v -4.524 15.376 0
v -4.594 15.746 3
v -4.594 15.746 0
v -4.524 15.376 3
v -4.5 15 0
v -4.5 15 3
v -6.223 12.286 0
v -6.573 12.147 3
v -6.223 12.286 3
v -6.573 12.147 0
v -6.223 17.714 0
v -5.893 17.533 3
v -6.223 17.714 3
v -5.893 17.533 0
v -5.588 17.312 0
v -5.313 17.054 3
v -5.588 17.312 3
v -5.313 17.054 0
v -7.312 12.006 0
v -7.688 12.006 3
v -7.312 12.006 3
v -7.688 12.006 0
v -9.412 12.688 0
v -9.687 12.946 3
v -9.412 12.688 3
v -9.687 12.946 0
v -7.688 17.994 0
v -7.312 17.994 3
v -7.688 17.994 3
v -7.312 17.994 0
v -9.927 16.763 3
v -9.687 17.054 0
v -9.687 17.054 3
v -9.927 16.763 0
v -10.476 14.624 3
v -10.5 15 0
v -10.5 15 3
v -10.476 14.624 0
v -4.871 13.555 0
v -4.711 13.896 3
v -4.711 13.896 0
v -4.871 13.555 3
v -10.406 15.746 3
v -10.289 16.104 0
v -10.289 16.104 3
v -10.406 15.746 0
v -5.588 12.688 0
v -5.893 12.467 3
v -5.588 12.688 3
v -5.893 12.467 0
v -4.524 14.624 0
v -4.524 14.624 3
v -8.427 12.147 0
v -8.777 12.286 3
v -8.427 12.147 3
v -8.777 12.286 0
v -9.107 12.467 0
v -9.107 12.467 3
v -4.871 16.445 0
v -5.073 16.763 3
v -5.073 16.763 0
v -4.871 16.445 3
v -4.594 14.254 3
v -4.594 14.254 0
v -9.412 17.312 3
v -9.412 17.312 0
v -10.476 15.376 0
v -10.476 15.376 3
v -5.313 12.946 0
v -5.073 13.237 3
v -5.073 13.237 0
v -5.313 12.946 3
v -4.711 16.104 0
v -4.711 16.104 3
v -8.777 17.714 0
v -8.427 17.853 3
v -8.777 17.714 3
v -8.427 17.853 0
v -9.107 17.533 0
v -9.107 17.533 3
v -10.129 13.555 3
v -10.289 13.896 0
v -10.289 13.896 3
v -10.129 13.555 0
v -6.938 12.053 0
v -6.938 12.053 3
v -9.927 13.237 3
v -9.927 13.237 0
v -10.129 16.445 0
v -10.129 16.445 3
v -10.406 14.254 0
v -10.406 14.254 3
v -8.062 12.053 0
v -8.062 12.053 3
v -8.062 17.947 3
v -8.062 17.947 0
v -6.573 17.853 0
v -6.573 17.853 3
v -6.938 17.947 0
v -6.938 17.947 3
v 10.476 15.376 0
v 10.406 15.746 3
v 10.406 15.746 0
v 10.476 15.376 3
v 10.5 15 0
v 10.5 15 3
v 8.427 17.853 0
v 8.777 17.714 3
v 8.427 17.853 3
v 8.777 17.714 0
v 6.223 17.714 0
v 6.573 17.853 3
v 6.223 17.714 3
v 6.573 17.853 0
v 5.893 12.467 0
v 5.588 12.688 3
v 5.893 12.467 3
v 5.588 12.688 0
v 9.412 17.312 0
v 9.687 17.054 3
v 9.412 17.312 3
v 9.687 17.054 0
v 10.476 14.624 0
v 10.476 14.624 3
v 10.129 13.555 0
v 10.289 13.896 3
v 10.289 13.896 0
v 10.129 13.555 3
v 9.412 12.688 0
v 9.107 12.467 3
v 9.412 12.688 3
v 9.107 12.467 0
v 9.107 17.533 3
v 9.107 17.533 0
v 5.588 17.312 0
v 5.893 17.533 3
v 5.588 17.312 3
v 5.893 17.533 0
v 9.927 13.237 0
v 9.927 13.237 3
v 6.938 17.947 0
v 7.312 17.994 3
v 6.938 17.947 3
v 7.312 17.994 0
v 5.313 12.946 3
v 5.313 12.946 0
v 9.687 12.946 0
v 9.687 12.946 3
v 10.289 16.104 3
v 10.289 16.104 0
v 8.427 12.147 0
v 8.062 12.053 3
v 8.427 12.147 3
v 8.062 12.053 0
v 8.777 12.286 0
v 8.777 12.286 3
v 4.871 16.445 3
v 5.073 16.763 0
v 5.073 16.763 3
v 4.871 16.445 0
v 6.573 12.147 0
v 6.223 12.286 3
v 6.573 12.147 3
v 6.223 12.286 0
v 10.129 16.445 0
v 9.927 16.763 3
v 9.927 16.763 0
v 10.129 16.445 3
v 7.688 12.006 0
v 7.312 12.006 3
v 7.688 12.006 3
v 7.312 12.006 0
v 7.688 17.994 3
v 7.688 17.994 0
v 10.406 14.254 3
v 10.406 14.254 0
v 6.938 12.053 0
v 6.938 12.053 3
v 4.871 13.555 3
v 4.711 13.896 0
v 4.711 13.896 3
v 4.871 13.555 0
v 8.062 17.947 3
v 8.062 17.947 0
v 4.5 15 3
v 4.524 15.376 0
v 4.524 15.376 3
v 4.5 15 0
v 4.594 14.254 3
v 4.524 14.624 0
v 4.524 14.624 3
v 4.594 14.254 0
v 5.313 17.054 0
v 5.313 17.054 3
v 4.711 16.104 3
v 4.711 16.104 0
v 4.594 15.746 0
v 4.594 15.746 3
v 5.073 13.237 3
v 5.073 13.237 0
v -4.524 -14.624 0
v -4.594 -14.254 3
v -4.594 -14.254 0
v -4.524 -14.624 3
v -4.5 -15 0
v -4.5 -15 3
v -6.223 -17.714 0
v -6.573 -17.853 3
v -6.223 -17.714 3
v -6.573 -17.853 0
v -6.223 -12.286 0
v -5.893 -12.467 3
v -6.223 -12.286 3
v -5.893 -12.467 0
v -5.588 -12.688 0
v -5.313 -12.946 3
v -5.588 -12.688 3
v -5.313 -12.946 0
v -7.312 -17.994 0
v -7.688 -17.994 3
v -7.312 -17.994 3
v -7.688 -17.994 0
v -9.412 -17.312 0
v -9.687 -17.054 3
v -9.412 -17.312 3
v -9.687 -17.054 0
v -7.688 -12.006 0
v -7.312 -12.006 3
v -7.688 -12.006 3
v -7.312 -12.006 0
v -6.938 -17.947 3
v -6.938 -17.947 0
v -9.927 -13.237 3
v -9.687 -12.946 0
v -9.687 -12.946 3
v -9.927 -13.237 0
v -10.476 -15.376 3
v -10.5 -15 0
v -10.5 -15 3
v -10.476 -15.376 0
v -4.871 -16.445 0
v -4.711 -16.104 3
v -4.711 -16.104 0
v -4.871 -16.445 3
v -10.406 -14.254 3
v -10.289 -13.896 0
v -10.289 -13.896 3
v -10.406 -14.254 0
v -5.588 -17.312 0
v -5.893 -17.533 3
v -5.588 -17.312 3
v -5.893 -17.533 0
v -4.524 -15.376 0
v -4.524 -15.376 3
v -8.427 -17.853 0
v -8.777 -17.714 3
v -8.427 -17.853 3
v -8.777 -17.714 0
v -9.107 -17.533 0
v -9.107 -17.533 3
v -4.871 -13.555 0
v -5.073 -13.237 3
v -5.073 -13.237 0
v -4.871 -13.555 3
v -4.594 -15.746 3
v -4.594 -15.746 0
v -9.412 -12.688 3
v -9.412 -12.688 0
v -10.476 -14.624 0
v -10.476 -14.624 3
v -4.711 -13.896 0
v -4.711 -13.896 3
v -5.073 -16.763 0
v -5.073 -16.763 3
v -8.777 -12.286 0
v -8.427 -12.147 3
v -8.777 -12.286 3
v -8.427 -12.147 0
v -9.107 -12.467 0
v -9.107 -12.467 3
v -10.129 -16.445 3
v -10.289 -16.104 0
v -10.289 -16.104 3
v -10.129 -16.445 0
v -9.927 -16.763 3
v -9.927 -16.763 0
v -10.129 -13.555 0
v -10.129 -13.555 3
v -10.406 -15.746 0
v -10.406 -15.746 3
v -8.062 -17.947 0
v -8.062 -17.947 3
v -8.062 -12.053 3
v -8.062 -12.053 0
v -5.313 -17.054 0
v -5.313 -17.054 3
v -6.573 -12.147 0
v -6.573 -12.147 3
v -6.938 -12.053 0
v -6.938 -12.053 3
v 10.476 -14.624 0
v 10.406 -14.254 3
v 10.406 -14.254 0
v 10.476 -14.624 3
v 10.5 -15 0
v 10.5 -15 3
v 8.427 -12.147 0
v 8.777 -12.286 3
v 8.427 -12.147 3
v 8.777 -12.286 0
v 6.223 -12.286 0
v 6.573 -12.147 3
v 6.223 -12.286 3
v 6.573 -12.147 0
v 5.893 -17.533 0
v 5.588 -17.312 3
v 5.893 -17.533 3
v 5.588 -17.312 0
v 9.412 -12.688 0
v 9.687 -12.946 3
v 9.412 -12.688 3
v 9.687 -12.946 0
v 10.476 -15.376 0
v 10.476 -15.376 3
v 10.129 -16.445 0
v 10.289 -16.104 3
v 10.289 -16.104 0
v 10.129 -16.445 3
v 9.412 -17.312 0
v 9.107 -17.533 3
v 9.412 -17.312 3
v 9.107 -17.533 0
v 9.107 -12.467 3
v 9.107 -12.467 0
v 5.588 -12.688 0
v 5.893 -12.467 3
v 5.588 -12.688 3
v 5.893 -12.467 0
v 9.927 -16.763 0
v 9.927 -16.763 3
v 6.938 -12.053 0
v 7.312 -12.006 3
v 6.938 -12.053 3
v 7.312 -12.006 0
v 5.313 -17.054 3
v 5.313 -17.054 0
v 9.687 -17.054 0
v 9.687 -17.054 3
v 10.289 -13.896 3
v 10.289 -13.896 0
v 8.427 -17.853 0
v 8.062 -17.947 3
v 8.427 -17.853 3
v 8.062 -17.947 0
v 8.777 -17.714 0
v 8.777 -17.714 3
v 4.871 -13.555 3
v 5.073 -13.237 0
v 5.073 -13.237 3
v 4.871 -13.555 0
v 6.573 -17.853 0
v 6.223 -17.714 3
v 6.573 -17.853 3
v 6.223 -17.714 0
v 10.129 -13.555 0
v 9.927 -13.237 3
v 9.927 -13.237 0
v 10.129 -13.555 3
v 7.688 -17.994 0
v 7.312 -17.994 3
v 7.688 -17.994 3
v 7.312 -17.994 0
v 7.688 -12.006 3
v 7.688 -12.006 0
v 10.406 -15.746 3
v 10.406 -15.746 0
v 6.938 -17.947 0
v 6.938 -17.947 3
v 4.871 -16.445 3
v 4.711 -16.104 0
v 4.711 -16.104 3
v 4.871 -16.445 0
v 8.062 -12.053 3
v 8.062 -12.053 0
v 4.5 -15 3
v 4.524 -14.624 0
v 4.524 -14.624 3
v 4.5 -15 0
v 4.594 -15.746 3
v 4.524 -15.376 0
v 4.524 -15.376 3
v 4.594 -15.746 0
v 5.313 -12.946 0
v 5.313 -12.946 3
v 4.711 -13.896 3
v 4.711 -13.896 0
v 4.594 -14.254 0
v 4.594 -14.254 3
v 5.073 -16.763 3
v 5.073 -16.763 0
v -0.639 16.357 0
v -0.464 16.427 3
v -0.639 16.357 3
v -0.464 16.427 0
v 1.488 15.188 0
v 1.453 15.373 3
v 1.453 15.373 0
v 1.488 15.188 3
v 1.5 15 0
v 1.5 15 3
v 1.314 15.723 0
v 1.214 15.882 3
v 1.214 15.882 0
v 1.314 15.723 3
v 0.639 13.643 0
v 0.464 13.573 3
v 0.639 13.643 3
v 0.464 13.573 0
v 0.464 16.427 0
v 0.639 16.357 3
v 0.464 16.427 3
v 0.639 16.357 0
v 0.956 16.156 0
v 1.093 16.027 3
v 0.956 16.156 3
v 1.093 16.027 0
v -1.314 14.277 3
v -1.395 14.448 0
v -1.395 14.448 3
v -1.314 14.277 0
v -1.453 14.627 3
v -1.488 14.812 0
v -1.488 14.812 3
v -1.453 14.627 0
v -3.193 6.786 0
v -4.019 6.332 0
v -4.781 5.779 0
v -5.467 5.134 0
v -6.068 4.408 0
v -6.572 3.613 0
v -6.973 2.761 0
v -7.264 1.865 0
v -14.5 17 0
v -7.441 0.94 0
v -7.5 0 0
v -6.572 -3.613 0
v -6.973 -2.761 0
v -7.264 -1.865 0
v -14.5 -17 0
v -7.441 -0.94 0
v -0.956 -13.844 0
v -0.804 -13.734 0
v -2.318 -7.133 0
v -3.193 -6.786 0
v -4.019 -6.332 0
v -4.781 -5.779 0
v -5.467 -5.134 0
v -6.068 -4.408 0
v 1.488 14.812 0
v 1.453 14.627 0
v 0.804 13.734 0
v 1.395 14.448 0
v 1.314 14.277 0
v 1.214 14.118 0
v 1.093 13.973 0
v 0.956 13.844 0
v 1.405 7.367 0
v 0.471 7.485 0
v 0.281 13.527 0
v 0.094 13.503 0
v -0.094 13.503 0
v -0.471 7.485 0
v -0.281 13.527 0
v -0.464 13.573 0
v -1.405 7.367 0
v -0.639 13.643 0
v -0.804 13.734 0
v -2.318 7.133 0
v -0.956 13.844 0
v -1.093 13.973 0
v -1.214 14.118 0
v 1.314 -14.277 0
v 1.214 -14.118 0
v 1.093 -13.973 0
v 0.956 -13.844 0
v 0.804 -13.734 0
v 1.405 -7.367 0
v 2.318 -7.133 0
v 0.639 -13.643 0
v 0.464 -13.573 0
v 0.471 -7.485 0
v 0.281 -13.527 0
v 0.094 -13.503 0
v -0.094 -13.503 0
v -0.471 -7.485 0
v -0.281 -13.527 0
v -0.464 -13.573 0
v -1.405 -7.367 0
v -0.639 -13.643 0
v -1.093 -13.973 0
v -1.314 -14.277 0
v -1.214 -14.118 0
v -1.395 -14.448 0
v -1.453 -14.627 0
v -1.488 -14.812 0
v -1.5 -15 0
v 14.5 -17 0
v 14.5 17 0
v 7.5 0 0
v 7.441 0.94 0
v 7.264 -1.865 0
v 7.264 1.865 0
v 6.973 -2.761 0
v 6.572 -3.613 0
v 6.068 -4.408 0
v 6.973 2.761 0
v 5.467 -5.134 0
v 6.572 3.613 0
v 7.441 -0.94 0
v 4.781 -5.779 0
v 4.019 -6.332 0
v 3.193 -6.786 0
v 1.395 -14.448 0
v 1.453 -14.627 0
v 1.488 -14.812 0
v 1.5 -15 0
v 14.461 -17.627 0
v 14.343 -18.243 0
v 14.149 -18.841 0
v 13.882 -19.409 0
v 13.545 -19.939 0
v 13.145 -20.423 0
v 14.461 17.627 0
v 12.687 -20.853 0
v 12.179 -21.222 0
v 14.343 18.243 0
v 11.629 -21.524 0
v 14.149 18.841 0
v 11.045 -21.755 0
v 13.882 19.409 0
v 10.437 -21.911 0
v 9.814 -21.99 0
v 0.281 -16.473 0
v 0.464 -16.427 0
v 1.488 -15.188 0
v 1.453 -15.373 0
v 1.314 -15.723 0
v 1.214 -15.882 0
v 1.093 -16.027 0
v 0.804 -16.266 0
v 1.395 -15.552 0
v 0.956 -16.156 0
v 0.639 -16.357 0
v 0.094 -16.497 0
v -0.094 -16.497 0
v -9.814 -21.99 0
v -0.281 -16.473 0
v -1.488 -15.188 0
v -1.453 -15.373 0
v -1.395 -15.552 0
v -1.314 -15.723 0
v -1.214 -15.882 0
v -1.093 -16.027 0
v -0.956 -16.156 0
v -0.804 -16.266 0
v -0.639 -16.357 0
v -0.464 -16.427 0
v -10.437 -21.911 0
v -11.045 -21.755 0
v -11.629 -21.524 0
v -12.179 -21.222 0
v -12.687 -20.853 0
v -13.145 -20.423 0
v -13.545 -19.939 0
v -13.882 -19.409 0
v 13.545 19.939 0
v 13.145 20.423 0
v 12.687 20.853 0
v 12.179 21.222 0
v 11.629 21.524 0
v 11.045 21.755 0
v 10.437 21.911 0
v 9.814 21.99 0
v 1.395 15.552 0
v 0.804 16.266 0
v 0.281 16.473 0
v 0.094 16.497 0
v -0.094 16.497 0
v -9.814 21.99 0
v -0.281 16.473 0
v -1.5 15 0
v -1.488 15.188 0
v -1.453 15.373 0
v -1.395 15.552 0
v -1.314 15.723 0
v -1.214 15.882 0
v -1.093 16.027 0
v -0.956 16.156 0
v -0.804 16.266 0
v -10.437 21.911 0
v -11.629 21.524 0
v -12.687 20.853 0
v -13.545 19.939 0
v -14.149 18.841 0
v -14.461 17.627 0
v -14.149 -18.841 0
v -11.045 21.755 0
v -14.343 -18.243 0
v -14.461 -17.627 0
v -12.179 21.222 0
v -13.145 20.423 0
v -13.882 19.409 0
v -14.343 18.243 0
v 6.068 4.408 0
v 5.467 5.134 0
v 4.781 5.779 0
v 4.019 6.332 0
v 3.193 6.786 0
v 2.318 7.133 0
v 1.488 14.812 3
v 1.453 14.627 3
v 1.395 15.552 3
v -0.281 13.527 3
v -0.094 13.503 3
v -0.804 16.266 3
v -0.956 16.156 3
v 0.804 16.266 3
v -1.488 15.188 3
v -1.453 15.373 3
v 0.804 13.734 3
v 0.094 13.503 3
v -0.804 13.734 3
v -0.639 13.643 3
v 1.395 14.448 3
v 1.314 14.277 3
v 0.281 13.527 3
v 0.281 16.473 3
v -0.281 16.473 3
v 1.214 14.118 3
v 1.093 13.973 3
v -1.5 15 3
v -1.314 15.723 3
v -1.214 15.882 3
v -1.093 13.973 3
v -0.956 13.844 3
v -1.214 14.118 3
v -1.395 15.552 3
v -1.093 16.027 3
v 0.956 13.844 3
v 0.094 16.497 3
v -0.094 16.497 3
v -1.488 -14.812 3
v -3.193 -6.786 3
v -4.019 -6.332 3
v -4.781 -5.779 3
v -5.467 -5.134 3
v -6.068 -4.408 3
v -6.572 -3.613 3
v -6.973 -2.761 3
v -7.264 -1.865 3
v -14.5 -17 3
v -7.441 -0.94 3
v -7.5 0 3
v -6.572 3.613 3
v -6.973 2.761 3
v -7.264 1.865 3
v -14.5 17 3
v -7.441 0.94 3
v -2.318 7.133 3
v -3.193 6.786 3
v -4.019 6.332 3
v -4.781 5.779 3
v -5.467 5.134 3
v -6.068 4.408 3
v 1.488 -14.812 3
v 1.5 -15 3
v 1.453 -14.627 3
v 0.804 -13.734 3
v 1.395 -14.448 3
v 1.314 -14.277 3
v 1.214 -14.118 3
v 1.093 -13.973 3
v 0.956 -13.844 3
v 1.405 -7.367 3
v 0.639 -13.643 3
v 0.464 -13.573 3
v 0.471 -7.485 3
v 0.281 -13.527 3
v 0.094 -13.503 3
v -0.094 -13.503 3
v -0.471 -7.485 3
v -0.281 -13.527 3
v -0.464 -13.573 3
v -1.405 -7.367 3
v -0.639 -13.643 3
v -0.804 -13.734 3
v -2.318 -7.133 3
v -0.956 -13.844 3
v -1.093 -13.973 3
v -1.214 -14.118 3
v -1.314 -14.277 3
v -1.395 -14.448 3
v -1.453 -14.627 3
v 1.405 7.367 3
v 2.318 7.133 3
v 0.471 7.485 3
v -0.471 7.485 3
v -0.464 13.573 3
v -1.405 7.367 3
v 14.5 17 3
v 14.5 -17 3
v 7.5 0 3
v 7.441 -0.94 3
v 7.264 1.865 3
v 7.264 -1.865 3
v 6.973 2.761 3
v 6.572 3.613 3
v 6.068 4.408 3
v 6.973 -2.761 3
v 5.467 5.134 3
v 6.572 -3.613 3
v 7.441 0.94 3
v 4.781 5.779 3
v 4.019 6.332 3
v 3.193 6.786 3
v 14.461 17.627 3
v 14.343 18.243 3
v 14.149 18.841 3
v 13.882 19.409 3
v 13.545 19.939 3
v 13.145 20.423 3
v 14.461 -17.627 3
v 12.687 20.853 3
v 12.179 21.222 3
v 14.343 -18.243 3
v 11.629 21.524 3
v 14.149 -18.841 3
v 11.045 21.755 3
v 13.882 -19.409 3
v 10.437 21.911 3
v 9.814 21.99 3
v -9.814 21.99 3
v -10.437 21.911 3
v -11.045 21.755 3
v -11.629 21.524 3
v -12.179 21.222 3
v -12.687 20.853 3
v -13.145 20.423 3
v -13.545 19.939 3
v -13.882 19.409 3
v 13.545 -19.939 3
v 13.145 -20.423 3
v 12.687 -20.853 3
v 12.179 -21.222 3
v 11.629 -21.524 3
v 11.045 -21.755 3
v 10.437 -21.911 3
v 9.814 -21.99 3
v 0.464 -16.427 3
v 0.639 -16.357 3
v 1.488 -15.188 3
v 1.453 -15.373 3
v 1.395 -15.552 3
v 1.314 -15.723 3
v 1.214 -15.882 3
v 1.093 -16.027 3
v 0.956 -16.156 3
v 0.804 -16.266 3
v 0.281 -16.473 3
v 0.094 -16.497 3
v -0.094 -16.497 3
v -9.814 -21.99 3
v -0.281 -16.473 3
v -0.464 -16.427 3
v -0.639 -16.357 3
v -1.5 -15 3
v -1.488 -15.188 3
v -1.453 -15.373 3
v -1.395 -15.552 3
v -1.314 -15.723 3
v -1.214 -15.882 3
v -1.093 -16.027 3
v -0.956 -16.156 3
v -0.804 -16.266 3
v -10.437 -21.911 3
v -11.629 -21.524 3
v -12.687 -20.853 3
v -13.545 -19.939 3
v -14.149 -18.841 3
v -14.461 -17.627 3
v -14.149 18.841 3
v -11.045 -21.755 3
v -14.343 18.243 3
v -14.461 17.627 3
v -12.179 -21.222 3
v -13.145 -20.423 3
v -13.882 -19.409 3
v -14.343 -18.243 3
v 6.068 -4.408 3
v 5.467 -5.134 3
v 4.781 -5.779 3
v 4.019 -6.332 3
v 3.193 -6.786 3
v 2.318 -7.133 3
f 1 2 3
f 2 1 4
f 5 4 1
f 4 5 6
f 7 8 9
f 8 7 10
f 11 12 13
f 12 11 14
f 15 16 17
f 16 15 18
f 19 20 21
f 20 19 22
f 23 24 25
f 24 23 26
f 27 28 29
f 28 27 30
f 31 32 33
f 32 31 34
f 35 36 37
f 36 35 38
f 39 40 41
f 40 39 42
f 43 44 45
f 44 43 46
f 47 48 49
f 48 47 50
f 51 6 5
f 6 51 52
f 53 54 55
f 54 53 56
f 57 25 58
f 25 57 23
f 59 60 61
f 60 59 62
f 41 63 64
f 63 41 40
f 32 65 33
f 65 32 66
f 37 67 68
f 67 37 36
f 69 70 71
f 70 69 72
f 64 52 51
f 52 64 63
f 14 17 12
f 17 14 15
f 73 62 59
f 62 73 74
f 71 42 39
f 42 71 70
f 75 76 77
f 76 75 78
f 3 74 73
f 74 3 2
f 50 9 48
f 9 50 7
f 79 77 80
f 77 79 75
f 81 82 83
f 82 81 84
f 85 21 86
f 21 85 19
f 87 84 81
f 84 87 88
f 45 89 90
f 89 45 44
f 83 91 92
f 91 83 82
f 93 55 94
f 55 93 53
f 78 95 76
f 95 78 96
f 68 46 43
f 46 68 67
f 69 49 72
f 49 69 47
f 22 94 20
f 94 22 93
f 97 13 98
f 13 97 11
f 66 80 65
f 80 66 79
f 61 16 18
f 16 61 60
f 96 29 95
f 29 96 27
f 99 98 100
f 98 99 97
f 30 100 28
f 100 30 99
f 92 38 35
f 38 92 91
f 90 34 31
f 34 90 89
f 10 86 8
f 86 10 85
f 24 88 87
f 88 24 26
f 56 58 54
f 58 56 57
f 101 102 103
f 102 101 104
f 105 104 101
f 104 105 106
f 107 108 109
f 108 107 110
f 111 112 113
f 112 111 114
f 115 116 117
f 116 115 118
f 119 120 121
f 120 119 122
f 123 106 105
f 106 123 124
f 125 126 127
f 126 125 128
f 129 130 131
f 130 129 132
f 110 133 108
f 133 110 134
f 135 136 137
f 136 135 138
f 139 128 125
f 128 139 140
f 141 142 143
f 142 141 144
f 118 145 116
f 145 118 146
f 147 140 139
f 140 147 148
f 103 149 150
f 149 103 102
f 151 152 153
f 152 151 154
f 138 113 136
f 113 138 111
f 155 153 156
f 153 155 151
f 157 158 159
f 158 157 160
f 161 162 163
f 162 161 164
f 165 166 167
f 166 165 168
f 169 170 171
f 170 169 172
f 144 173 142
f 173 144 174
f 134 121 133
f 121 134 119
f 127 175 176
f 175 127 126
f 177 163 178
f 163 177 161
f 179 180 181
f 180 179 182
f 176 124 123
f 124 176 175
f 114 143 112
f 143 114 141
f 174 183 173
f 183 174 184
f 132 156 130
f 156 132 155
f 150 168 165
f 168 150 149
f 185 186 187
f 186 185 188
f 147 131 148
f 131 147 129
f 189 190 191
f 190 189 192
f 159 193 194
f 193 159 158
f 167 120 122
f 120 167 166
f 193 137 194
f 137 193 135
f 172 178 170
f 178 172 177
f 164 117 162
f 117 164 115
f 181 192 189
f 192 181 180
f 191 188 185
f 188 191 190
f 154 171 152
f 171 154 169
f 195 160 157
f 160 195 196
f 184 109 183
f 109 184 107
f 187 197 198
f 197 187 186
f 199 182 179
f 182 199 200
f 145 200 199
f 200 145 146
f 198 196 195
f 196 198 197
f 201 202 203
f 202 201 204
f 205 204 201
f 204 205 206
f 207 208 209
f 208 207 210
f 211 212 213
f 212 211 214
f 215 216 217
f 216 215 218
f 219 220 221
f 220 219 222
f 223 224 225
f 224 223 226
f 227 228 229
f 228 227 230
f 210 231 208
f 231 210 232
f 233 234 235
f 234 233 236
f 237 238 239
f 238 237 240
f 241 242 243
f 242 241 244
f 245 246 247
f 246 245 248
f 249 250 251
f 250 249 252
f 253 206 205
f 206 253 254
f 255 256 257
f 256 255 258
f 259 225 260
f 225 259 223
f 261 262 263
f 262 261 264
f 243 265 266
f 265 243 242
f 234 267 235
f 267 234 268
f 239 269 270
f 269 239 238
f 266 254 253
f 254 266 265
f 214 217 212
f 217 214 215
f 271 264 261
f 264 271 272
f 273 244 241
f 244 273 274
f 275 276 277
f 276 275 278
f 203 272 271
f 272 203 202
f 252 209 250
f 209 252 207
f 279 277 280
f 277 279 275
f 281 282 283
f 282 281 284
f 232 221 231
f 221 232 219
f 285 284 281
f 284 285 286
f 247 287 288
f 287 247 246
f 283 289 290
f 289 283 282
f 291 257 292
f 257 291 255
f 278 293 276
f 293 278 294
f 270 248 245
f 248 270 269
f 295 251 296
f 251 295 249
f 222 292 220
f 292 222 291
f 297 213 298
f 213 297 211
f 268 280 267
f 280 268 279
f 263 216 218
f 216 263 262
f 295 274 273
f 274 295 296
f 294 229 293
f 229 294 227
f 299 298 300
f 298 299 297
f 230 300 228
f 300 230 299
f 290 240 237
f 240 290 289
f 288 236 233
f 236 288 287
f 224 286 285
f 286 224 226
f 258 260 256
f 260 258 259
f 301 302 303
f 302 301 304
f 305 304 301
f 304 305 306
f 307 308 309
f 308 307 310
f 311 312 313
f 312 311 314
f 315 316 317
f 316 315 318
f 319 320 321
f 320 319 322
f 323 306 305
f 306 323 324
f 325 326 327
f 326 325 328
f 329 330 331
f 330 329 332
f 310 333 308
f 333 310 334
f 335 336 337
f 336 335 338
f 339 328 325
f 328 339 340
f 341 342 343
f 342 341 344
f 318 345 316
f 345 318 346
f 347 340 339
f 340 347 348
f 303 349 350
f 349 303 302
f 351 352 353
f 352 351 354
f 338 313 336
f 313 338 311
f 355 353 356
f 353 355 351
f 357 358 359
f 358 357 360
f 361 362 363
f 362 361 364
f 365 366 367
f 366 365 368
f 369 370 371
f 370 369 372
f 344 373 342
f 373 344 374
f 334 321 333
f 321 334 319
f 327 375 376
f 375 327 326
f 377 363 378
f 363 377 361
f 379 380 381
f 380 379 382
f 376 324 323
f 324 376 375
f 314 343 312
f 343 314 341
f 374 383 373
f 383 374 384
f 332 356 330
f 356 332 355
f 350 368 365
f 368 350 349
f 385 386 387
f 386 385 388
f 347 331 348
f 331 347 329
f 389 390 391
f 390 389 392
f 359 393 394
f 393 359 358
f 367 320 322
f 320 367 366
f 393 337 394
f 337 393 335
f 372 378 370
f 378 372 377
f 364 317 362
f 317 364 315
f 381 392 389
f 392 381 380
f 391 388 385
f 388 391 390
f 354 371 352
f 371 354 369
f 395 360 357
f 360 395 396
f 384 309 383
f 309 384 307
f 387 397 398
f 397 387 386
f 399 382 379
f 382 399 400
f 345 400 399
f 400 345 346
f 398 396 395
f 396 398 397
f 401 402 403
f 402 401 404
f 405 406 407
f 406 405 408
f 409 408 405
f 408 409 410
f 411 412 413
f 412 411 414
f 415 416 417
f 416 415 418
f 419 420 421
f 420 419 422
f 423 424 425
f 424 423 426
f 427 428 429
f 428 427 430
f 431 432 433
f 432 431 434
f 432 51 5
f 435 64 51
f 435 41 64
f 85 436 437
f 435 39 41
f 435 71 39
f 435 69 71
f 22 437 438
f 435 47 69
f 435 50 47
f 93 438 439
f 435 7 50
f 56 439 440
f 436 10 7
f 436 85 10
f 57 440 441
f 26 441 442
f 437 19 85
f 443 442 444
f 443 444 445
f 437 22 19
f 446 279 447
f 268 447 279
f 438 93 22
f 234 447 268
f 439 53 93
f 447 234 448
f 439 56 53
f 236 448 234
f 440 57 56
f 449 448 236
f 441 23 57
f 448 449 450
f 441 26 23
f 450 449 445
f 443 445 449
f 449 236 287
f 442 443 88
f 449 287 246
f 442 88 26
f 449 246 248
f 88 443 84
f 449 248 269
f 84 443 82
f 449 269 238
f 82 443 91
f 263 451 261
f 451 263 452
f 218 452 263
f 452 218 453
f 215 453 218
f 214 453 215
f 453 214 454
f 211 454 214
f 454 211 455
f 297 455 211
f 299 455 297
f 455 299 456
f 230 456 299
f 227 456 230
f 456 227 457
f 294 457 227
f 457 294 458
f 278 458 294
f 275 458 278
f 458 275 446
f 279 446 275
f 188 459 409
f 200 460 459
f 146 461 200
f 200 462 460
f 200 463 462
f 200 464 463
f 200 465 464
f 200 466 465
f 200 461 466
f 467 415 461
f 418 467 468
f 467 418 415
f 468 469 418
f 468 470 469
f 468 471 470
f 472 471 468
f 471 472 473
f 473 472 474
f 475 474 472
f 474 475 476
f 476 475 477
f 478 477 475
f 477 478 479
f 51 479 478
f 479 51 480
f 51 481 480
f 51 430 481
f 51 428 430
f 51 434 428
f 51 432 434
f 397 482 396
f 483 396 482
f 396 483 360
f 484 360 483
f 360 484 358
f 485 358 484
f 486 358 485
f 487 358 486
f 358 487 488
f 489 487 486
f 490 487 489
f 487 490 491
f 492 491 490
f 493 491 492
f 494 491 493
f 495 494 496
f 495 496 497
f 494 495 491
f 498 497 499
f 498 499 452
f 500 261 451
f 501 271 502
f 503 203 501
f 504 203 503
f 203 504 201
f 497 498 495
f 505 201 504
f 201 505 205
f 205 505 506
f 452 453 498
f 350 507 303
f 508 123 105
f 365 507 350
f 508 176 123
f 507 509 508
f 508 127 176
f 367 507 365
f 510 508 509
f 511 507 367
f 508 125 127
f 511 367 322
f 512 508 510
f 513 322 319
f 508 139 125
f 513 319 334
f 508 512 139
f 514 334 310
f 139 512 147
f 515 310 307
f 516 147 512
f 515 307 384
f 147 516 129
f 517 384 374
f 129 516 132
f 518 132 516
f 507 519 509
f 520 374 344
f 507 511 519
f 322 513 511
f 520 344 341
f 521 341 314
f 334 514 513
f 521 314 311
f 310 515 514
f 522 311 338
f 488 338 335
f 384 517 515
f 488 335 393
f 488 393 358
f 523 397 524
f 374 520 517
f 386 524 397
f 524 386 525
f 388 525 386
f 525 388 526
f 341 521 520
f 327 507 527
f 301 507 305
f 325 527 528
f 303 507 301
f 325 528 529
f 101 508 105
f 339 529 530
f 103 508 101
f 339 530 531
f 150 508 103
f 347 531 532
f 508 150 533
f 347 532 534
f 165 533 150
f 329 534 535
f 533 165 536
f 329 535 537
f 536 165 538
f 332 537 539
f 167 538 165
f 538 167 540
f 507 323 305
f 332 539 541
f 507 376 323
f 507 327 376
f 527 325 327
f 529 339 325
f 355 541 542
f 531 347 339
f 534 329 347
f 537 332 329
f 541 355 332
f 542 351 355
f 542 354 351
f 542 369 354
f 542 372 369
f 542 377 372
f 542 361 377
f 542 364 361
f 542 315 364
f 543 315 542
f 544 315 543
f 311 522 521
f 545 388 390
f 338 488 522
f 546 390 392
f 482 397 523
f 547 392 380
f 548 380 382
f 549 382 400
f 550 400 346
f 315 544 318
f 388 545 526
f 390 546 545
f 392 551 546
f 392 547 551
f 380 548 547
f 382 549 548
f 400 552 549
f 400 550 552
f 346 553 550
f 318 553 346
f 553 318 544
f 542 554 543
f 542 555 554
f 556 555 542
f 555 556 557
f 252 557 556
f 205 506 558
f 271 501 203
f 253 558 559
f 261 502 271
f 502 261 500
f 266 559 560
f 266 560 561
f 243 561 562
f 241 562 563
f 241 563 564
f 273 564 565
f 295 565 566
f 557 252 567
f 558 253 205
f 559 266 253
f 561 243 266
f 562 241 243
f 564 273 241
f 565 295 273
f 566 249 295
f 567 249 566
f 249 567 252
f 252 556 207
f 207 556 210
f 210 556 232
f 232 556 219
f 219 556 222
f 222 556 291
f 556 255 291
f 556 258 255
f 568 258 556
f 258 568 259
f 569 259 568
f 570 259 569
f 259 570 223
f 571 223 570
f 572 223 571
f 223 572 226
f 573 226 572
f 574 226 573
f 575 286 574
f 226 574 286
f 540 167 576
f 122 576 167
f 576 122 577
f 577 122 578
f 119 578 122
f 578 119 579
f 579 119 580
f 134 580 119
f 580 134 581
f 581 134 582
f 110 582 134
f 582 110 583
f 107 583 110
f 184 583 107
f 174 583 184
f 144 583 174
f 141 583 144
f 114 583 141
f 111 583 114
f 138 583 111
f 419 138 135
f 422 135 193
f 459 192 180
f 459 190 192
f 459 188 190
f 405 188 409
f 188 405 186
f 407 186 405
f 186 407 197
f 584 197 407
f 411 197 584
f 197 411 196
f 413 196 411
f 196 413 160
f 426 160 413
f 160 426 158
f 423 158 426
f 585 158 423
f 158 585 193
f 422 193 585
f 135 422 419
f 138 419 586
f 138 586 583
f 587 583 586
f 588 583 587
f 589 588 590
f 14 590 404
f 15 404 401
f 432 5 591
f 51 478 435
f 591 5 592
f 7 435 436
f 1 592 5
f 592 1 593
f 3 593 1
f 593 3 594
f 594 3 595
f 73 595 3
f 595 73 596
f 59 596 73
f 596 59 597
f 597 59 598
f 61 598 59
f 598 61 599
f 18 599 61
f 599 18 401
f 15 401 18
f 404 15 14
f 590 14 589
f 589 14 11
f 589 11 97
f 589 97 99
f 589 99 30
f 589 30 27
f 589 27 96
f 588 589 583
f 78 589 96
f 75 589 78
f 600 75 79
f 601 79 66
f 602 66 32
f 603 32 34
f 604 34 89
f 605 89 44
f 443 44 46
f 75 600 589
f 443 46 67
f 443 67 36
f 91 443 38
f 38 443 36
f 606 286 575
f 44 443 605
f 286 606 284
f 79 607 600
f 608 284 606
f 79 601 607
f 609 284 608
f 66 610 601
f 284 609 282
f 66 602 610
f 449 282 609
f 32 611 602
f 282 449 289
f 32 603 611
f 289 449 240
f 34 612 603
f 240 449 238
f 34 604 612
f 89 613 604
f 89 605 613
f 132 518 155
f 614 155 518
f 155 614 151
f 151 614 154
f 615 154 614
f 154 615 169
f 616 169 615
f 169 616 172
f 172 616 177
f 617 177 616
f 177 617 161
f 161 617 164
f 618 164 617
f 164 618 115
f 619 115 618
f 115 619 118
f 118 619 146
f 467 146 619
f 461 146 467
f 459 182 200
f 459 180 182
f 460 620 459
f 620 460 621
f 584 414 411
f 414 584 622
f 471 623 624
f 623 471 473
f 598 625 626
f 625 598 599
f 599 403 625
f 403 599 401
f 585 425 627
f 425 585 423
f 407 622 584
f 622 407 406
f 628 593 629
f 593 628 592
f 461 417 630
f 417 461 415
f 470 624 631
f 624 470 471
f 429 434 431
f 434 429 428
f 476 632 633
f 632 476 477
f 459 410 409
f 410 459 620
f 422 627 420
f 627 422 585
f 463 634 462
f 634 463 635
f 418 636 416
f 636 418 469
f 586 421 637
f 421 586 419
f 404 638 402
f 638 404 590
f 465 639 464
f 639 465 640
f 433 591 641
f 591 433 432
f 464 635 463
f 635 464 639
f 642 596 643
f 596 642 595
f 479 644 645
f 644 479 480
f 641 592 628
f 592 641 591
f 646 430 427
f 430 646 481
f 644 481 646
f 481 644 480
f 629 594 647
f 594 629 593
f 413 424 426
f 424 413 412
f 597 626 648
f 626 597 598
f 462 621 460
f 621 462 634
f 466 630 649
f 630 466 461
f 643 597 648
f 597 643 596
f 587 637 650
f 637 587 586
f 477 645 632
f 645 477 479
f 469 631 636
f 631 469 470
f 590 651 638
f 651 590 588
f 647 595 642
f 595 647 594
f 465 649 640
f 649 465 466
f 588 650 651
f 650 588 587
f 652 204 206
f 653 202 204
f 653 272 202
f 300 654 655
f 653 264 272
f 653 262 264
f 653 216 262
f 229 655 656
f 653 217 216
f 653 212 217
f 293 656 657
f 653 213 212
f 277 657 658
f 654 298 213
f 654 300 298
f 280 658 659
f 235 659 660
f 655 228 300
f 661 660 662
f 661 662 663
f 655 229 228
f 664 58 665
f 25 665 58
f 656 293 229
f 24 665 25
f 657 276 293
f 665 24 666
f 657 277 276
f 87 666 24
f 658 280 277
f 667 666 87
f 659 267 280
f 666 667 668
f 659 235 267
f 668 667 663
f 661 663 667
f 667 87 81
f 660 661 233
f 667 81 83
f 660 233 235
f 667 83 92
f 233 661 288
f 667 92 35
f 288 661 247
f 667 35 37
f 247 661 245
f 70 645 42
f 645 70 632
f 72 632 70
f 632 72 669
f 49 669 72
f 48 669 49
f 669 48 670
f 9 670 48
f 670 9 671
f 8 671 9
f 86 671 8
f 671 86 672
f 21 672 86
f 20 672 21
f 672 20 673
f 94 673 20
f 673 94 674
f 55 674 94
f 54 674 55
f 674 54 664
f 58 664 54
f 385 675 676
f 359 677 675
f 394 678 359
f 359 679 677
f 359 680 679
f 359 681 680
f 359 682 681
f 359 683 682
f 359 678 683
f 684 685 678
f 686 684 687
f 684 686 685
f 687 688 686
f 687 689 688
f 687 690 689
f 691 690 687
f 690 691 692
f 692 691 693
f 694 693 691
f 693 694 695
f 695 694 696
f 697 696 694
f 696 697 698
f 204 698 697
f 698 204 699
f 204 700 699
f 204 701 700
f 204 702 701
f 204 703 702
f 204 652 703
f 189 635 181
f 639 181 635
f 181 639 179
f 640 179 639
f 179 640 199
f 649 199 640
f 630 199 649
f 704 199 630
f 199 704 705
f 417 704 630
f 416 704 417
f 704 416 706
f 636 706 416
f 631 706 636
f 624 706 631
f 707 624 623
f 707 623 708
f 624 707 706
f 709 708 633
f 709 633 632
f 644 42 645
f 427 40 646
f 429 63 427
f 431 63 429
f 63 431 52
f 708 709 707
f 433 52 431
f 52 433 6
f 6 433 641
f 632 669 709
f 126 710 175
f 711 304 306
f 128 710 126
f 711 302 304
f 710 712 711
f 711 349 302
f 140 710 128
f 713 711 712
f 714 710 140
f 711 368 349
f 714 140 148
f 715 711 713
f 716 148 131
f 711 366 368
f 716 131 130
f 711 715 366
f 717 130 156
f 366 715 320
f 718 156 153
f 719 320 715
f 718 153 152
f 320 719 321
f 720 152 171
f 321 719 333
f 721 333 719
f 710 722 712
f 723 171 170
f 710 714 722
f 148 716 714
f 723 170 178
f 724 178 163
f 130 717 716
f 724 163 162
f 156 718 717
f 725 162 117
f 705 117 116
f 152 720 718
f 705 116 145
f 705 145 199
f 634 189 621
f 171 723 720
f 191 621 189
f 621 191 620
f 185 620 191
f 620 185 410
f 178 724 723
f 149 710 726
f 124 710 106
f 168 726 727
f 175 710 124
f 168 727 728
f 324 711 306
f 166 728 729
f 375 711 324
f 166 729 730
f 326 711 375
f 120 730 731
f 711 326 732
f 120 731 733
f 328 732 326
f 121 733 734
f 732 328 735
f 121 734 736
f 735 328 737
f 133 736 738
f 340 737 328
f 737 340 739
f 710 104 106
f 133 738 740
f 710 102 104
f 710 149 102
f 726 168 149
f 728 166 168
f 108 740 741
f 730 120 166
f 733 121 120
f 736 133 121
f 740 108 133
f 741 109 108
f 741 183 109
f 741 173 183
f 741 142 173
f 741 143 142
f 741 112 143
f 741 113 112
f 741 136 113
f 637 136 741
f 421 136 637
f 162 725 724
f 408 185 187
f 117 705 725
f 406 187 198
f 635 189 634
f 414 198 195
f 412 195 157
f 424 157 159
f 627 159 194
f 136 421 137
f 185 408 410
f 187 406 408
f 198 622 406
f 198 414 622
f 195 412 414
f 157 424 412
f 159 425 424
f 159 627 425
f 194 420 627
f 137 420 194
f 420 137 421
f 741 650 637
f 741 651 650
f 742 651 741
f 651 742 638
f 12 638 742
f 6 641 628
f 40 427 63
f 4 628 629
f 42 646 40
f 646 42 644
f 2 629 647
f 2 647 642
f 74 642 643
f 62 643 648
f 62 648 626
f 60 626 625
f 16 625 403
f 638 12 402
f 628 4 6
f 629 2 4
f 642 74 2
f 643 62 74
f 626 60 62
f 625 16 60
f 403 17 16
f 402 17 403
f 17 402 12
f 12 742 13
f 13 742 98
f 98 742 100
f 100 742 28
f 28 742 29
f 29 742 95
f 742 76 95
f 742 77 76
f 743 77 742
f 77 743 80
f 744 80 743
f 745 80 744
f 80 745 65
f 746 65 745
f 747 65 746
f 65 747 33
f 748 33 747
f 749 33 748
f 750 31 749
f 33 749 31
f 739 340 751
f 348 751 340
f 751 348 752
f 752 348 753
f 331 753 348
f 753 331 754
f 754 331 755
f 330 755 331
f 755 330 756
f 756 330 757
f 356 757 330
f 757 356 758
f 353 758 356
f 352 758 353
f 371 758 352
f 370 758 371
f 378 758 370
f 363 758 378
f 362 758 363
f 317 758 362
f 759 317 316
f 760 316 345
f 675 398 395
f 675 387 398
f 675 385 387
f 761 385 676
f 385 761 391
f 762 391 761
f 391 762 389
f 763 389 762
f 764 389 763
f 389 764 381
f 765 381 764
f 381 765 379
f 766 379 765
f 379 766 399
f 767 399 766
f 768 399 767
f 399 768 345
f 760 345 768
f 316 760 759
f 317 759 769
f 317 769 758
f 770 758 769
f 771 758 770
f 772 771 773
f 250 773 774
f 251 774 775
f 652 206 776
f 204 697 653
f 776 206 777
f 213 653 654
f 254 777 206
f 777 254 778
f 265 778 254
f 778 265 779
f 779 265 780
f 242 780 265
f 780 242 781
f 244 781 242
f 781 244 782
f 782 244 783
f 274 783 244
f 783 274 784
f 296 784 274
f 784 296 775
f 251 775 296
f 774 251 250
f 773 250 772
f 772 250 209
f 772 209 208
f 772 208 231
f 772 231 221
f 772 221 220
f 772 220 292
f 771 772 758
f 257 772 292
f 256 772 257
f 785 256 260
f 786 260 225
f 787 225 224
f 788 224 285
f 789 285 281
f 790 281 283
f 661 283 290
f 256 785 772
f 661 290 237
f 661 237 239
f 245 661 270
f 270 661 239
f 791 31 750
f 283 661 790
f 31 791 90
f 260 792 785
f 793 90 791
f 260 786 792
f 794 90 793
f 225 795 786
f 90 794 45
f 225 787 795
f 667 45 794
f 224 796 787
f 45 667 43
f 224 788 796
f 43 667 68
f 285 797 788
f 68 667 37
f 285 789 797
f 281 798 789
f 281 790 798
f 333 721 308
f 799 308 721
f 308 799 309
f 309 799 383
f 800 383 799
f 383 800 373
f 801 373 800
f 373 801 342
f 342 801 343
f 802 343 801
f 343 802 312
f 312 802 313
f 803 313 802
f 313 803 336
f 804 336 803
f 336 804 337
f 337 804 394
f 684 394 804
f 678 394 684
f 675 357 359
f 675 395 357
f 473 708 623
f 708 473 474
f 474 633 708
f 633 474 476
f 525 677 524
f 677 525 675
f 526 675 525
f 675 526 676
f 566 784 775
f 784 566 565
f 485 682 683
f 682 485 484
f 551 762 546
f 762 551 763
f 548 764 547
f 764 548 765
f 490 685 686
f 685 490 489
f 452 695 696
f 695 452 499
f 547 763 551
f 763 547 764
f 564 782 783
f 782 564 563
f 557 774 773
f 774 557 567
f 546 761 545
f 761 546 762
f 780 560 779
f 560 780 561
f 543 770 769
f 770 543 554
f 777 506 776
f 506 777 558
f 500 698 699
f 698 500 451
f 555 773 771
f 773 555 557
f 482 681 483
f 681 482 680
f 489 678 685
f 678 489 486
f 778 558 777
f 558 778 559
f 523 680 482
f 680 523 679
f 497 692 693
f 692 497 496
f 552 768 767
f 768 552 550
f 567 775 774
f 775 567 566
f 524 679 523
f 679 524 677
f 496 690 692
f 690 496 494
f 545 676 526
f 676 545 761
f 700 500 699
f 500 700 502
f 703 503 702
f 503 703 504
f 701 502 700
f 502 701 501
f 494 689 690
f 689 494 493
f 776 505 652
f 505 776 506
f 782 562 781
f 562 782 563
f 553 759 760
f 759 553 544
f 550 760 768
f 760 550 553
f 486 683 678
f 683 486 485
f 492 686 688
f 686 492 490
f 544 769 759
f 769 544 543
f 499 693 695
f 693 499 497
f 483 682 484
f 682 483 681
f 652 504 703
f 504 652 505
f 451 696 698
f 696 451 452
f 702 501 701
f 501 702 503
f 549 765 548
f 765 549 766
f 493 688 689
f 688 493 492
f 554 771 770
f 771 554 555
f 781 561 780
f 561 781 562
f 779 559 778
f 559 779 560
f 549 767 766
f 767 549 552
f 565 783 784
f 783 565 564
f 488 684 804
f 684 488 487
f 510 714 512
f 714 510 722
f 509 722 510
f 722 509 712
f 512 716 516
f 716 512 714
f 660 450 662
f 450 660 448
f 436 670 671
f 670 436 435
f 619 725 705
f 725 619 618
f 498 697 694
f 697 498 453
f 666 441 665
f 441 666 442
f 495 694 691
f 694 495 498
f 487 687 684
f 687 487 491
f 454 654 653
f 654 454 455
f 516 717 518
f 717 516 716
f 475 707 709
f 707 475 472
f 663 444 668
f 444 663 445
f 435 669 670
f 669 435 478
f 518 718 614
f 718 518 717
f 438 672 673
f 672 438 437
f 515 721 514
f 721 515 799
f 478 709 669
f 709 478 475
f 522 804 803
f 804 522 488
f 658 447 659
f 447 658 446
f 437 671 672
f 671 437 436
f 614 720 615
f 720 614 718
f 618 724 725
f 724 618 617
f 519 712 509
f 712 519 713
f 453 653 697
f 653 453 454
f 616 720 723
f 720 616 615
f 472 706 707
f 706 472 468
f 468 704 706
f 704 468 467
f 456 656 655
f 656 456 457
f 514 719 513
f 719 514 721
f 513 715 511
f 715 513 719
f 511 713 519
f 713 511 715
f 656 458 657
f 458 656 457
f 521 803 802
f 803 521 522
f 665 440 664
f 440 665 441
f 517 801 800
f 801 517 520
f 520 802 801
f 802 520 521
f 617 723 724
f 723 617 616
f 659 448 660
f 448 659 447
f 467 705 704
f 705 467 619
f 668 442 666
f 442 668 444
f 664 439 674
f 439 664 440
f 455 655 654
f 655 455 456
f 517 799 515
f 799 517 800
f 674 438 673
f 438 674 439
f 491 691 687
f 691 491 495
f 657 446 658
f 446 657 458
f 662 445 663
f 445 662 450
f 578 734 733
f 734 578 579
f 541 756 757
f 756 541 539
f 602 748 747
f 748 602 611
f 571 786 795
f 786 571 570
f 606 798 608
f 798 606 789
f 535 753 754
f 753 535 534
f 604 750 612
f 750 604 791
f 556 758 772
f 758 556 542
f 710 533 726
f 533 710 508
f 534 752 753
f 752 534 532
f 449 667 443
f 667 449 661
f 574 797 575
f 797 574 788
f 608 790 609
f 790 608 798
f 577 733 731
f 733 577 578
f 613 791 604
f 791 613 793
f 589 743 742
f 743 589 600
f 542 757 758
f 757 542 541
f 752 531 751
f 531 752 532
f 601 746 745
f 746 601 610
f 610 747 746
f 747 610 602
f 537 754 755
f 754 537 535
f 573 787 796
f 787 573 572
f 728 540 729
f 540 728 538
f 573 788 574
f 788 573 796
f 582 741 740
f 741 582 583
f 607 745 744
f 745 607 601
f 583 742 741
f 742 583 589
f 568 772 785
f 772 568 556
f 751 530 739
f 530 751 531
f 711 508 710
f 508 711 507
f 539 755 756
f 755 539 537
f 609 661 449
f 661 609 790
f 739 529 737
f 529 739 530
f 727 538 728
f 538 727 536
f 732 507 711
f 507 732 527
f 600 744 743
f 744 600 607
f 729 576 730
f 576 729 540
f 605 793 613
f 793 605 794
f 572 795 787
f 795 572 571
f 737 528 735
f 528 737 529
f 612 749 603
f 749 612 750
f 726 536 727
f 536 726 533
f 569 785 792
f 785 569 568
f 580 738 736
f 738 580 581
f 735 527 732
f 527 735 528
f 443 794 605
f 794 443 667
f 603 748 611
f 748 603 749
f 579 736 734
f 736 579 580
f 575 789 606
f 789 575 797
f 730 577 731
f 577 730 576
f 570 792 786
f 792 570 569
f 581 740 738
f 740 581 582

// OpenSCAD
$fn = 50;


difference() {
	union() {
		hull() {
			translate(v = [-9.5000000000, 17.0000000000, 0]) {
				cylinder(h = 3, r = 5);
			}
			translate(v = [9.5000000000, 17.0000000000, 0]) {
				cylinder(h = 3, r = 5);
			}
			translate(v = [-9.5000000000, -17.0000000000, 0]) {
				cylinder(h = 3, r = 5);
			}
			translate(v = [9.5000000000, -17.0000000000, 0]) {
				cylinder(h = 3, r = 5);
			}
		}
	}
	union() {
		#translate(v = [-7.5000000000, 15.0000000000, 0]) {
			cylinder(h = 3, r = 3.0000000000);
		}
		#translate(v = [7.5000000000, 15.0000000000, 0]) {
			cylinder(h = 3, r = 3.0000000000);
		}
		#translate(v = [-7.5000000000, -15.0000000000, 0]) {
			cylinder(h = 3, r = 3.0000000000);
		}
		#translate(v = [7.5000000000, -15.0000000000, 0]) {
			cylinder(h = 3, r = 3.0000000000);
		}
		#translate(v = [-7.5000000000, -15.0000000000, -100.0000000000]) {
			cylinder(h = 200, r = 3.0000000000);
		}
		#translate(v = [-7.5000000000, 15.0000000000, -100.0000000000]) {
			cylinder(h = 200, r = 3.0000000000);
		}
		#translate(v = [7.5000000000, -15.0000000000, -100.0000000000]) {
			cylinder(h = 200, r = 3.0000000000);
		}
		#translate(v = [7.5000000000, 15.0000000000, -100.0000000000]) {
			cylinder(h = 200, r = 3.0000000000);
		}
		#translate(v = [-7.5000000000, 15.0000000000, 0]) {
			cylinder(h = 3, r = 1.5000000000);
		}
		#translate(v = [0.0000000000, 15.0000000000, 0]) {
			cylinder(h = 3, r = 1.5000000000);
		}
		#translate(v = [7.5000000000, 15.0000000000, 0]) {
			cylinder(h = 3, r = 1.5000000000);
		}
		#translate(v = [-7.5000000000, -15.0000000000, 0]) {
			cylinder(h = 3, r = 1.5000000000);
		}
		#translate(v = [0.0000000000, -15.0000000000, 0]) {
			cylinder(h = 3, r = 1.5000000000);
		}
		#translate(v = [7.5000000000, -15.0000000000, 0]) {
			cylinder(h = 3, r = 1.5000000000);
		}
		#translate(v = [-7.5000000000, 15.0000000000, 0]) {
			cylinder(h = 3, r = 1.5000000000);
		}
		#translate(v = [0.0000000000, 15.0000000000, 0]) {
			cylinder(h = 3, r = 1.5000000000);
		}
		#translate(v = [7.5000000000, 15.0000000000, 0]) {
			cylinder(h = 3, r = 1.5000000000);
		}
		#translate(v = [-7.5000000000, -15.0000000000, 0]) {
			cylinder(h = 3, r = 1.5000000000);
		}
		#translate(v = [0.0000000000, -15.0000000000, 0]) {
			cylinder(h = 3, r = 1.5000000000);
		}
		#translate(v = [7.5000000000, -15.0000000000, 0]) {
			cylinder(h = 3, r = 1.5000000000);
		}
		#translate(v = [-7.5000000000, 15.0000000000, 0]) {
			cylinder(h = 3, r = 1.5000000000);
		}
		#translate(v = [0.0000000000, 15.0000000000, 0]) {
			cylinder(h = 3, r = 1.5000000000);
		}
		#translate(v = [7.5000000000, 15.0000000000, 0]) {
			cylinder(h = 3, r = 1.5000000000);
		}
		#translate(v = [-7.5000000000, -15.0000000000, 0]) {
			cylinder(h = 3, r = 1.5000000000);
		}
		#translate(v = [0.0000000000, -15.0000000000, 0]) {
			cylinder(h = 3, r = 1.5000000000);
		}
		#translate(v = [7.5000000000, -15.0000000000, 0]) {
			cylinder(h = 3, r = 1.5000000000);
		}
		#cylinder(h = 3, r = 7.5000000000);
	}
}
